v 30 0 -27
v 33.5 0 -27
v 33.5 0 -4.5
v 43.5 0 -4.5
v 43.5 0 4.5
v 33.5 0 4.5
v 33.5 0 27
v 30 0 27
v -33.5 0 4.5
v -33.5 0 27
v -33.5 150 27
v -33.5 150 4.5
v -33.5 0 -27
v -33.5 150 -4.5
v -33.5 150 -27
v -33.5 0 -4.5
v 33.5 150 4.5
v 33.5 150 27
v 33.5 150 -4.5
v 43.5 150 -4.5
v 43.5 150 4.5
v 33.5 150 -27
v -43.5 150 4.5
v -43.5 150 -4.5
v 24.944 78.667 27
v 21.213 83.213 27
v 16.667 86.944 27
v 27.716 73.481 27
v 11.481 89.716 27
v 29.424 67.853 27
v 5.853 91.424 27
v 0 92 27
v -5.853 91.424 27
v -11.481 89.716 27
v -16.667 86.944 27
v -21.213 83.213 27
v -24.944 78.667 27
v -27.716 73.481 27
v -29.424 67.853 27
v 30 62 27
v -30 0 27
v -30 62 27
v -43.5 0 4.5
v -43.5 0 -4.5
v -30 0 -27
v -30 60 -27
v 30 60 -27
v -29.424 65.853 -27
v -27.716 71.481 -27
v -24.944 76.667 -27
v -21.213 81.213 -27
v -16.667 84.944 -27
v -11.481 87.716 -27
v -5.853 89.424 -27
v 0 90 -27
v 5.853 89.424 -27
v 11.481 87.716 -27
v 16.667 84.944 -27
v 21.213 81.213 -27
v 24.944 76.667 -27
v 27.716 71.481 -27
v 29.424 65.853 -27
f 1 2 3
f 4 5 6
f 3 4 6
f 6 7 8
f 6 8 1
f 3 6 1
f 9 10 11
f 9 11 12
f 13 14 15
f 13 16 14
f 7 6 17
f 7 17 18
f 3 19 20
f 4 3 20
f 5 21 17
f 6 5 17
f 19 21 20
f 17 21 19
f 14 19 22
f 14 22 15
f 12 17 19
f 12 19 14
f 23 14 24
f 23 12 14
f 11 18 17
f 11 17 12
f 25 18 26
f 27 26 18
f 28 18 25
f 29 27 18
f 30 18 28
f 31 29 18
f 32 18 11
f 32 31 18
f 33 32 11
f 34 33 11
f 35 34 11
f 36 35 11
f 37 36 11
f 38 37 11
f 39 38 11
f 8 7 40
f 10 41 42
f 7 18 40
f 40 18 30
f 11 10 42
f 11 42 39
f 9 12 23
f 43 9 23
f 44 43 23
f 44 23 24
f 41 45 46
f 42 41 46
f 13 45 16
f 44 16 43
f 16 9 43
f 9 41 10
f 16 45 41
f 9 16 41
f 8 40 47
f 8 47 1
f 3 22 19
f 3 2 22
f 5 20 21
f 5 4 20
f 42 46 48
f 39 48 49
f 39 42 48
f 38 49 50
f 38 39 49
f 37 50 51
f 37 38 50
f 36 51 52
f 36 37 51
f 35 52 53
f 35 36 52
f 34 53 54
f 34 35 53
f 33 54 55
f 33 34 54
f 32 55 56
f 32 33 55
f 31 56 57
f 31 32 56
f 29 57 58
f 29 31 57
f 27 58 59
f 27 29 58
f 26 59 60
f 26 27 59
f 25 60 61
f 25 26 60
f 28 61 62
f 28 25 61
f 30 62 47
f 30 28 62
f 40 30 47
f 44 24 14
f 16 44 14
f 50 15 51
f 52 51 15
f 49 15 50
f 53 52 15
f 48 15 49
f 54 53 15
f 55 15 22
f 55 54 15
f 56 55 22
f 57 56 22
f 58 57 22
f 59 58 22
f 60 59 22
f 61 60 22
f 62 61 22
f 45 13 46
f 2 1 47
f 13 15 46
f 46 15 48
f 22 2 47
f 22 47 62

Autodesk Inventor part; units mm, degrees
ref_plane "YZ Plane" through (0, 0, 0) normal (1, 0, 0) x (0, 1, 0)
ref_plane "XZ Plane" through (0, 0, 0) normal (0, 1, 0) x (-1, 0, 0)
ref_plane "XY Plane" through (0, 0, 0) normal (0, 0, 1) x (1, 0, 0)
sketch "草圖1" plane through (0, 0, 0) normal (0, 1, 0) x (-1, 0, 0)
  line L0 (-33.5, 27) -> (33.5, 27)
  line L1 (33.5, 27) -> (33.5, -27)
  line L2 (33.5, -27) -> (-33.5, -27)
  line L3 (-33.5, -27) -> (-33.5, 27)
  line L4 (-33.5, 27) -> (33.5, -27) construction
  line L5 (33.5, 27) -> (-33.5, -27) construction
  line L6 (43.5, -4.5) -> (33.5, -4.5)
  line L7 (33.5, -4.5) -> (33.5, 4.5)
  line L8 (33.5, 4.5) -> (43.5, 4.5)
  line L9 (43.5, 4.5) -> (43.5, -4.5)
  line L10 (-33.5, -4.5) -> (-43.5, -4.5)
  line L11 (-43.5, -4.5) -> (-43.5, 4.5)
  line L12 (-43.5, 4.5) -> (-33.5, 4.5)
  line L13 (-33.5, 4.5) -> (-33.5, -4.5)
  point P0 (0, 0)
  point P1 (33.5, 0)
  point P2 (-33.5, 0)
  point P3 (-33.5, 4.5)
  point P4 (-33.5, -4.5)
  dimension "d0" = 67
  dimension "d1" = 54
  dimension "d2" = 9
  dimension "d3" = 10
extrude "擠出1" add sketch "草圖1" along normal blind 150
sketch "草圖2" plane through (-33.5, 0, 27) normal (0, 0, 1) x (1, 0, 0)
  line L0 (0, 0) -> (0, 150) projected
  line L1 (0, 150) -> (67, 150) projected
  line L2 (67, 150) -> (67, 0) projected
  line L3 (67, 0) -> (0, 0) projected
  circle A0 centre (33.5, 56) radius 30
  line L4 (3.5, 56) -> (63.5, 56)
  line L5 (63.5, 56) -> (63.5, -16.9471)
  line L6 (63.5, -16.9471) -> (3.5, -16.9471)
  line L7 (3.5, -16.9471) -> (3.5, 56)
  point P0 (33.5, 0)
  point P1 (33.5, 0)
  point P2 (3.5, 56)
  dimension "d6" = 60
  dimension "d7" = 56
extrude "擠出2" cut sketch "草圖2" against normal through all contours L7 A0 L5 L3 | L3 L5 L6 L7 | L4 A0 | A0 L4
sketch "草圖3" plane through (33.5, 150, -27) normal (0, 0, -1) x (-1, 0, 0)
  arc A0 (63.5, -94) -> (3.5, -94) centre (33.5, -94) ccw construction
  circle A1 centre (33.5, -90) radius 30
  line L0 (63.5, -150) -> (3.5, -150)
  line L1 (3.5, -150) -> (3.5, -90)
  line L2 (3.5, -90) -> (63.5, -90)
  line L3 (63.5, -90) -> (63.5, -150)
  point P0 (33.5, -150)
  point P1 (33.5, -150)
  point P2 (63.5, -150)
  dimension "d10" = 60
  dimension "d11" = 4
sketch "草圖4" plane through (-33.5, 150, 27) normal (0, 0, 1) x (1, 0, 0)
  arc A0 (63.5, -94) -> (3.5, -94) centre (33.5, -94) ccw construction
  circle A1 centre (33.5, -88) radius 30
  line L0 (63.5, -150) -> (3.5, -150)
  line L1 (3.5, -150) -> (3.5, -88)
  line L2 (3.5, -88) -> (63.5, -88)
  line L3 (63.5, -88) -> (63.5, -150)
  point P0 (33.5, -150)
  dimension "d12" = 6
  dimension "d13" = 60
loft "斷面混成1" cut profiles "草圖3", "草圖4"
properties part number "Slider-2"
